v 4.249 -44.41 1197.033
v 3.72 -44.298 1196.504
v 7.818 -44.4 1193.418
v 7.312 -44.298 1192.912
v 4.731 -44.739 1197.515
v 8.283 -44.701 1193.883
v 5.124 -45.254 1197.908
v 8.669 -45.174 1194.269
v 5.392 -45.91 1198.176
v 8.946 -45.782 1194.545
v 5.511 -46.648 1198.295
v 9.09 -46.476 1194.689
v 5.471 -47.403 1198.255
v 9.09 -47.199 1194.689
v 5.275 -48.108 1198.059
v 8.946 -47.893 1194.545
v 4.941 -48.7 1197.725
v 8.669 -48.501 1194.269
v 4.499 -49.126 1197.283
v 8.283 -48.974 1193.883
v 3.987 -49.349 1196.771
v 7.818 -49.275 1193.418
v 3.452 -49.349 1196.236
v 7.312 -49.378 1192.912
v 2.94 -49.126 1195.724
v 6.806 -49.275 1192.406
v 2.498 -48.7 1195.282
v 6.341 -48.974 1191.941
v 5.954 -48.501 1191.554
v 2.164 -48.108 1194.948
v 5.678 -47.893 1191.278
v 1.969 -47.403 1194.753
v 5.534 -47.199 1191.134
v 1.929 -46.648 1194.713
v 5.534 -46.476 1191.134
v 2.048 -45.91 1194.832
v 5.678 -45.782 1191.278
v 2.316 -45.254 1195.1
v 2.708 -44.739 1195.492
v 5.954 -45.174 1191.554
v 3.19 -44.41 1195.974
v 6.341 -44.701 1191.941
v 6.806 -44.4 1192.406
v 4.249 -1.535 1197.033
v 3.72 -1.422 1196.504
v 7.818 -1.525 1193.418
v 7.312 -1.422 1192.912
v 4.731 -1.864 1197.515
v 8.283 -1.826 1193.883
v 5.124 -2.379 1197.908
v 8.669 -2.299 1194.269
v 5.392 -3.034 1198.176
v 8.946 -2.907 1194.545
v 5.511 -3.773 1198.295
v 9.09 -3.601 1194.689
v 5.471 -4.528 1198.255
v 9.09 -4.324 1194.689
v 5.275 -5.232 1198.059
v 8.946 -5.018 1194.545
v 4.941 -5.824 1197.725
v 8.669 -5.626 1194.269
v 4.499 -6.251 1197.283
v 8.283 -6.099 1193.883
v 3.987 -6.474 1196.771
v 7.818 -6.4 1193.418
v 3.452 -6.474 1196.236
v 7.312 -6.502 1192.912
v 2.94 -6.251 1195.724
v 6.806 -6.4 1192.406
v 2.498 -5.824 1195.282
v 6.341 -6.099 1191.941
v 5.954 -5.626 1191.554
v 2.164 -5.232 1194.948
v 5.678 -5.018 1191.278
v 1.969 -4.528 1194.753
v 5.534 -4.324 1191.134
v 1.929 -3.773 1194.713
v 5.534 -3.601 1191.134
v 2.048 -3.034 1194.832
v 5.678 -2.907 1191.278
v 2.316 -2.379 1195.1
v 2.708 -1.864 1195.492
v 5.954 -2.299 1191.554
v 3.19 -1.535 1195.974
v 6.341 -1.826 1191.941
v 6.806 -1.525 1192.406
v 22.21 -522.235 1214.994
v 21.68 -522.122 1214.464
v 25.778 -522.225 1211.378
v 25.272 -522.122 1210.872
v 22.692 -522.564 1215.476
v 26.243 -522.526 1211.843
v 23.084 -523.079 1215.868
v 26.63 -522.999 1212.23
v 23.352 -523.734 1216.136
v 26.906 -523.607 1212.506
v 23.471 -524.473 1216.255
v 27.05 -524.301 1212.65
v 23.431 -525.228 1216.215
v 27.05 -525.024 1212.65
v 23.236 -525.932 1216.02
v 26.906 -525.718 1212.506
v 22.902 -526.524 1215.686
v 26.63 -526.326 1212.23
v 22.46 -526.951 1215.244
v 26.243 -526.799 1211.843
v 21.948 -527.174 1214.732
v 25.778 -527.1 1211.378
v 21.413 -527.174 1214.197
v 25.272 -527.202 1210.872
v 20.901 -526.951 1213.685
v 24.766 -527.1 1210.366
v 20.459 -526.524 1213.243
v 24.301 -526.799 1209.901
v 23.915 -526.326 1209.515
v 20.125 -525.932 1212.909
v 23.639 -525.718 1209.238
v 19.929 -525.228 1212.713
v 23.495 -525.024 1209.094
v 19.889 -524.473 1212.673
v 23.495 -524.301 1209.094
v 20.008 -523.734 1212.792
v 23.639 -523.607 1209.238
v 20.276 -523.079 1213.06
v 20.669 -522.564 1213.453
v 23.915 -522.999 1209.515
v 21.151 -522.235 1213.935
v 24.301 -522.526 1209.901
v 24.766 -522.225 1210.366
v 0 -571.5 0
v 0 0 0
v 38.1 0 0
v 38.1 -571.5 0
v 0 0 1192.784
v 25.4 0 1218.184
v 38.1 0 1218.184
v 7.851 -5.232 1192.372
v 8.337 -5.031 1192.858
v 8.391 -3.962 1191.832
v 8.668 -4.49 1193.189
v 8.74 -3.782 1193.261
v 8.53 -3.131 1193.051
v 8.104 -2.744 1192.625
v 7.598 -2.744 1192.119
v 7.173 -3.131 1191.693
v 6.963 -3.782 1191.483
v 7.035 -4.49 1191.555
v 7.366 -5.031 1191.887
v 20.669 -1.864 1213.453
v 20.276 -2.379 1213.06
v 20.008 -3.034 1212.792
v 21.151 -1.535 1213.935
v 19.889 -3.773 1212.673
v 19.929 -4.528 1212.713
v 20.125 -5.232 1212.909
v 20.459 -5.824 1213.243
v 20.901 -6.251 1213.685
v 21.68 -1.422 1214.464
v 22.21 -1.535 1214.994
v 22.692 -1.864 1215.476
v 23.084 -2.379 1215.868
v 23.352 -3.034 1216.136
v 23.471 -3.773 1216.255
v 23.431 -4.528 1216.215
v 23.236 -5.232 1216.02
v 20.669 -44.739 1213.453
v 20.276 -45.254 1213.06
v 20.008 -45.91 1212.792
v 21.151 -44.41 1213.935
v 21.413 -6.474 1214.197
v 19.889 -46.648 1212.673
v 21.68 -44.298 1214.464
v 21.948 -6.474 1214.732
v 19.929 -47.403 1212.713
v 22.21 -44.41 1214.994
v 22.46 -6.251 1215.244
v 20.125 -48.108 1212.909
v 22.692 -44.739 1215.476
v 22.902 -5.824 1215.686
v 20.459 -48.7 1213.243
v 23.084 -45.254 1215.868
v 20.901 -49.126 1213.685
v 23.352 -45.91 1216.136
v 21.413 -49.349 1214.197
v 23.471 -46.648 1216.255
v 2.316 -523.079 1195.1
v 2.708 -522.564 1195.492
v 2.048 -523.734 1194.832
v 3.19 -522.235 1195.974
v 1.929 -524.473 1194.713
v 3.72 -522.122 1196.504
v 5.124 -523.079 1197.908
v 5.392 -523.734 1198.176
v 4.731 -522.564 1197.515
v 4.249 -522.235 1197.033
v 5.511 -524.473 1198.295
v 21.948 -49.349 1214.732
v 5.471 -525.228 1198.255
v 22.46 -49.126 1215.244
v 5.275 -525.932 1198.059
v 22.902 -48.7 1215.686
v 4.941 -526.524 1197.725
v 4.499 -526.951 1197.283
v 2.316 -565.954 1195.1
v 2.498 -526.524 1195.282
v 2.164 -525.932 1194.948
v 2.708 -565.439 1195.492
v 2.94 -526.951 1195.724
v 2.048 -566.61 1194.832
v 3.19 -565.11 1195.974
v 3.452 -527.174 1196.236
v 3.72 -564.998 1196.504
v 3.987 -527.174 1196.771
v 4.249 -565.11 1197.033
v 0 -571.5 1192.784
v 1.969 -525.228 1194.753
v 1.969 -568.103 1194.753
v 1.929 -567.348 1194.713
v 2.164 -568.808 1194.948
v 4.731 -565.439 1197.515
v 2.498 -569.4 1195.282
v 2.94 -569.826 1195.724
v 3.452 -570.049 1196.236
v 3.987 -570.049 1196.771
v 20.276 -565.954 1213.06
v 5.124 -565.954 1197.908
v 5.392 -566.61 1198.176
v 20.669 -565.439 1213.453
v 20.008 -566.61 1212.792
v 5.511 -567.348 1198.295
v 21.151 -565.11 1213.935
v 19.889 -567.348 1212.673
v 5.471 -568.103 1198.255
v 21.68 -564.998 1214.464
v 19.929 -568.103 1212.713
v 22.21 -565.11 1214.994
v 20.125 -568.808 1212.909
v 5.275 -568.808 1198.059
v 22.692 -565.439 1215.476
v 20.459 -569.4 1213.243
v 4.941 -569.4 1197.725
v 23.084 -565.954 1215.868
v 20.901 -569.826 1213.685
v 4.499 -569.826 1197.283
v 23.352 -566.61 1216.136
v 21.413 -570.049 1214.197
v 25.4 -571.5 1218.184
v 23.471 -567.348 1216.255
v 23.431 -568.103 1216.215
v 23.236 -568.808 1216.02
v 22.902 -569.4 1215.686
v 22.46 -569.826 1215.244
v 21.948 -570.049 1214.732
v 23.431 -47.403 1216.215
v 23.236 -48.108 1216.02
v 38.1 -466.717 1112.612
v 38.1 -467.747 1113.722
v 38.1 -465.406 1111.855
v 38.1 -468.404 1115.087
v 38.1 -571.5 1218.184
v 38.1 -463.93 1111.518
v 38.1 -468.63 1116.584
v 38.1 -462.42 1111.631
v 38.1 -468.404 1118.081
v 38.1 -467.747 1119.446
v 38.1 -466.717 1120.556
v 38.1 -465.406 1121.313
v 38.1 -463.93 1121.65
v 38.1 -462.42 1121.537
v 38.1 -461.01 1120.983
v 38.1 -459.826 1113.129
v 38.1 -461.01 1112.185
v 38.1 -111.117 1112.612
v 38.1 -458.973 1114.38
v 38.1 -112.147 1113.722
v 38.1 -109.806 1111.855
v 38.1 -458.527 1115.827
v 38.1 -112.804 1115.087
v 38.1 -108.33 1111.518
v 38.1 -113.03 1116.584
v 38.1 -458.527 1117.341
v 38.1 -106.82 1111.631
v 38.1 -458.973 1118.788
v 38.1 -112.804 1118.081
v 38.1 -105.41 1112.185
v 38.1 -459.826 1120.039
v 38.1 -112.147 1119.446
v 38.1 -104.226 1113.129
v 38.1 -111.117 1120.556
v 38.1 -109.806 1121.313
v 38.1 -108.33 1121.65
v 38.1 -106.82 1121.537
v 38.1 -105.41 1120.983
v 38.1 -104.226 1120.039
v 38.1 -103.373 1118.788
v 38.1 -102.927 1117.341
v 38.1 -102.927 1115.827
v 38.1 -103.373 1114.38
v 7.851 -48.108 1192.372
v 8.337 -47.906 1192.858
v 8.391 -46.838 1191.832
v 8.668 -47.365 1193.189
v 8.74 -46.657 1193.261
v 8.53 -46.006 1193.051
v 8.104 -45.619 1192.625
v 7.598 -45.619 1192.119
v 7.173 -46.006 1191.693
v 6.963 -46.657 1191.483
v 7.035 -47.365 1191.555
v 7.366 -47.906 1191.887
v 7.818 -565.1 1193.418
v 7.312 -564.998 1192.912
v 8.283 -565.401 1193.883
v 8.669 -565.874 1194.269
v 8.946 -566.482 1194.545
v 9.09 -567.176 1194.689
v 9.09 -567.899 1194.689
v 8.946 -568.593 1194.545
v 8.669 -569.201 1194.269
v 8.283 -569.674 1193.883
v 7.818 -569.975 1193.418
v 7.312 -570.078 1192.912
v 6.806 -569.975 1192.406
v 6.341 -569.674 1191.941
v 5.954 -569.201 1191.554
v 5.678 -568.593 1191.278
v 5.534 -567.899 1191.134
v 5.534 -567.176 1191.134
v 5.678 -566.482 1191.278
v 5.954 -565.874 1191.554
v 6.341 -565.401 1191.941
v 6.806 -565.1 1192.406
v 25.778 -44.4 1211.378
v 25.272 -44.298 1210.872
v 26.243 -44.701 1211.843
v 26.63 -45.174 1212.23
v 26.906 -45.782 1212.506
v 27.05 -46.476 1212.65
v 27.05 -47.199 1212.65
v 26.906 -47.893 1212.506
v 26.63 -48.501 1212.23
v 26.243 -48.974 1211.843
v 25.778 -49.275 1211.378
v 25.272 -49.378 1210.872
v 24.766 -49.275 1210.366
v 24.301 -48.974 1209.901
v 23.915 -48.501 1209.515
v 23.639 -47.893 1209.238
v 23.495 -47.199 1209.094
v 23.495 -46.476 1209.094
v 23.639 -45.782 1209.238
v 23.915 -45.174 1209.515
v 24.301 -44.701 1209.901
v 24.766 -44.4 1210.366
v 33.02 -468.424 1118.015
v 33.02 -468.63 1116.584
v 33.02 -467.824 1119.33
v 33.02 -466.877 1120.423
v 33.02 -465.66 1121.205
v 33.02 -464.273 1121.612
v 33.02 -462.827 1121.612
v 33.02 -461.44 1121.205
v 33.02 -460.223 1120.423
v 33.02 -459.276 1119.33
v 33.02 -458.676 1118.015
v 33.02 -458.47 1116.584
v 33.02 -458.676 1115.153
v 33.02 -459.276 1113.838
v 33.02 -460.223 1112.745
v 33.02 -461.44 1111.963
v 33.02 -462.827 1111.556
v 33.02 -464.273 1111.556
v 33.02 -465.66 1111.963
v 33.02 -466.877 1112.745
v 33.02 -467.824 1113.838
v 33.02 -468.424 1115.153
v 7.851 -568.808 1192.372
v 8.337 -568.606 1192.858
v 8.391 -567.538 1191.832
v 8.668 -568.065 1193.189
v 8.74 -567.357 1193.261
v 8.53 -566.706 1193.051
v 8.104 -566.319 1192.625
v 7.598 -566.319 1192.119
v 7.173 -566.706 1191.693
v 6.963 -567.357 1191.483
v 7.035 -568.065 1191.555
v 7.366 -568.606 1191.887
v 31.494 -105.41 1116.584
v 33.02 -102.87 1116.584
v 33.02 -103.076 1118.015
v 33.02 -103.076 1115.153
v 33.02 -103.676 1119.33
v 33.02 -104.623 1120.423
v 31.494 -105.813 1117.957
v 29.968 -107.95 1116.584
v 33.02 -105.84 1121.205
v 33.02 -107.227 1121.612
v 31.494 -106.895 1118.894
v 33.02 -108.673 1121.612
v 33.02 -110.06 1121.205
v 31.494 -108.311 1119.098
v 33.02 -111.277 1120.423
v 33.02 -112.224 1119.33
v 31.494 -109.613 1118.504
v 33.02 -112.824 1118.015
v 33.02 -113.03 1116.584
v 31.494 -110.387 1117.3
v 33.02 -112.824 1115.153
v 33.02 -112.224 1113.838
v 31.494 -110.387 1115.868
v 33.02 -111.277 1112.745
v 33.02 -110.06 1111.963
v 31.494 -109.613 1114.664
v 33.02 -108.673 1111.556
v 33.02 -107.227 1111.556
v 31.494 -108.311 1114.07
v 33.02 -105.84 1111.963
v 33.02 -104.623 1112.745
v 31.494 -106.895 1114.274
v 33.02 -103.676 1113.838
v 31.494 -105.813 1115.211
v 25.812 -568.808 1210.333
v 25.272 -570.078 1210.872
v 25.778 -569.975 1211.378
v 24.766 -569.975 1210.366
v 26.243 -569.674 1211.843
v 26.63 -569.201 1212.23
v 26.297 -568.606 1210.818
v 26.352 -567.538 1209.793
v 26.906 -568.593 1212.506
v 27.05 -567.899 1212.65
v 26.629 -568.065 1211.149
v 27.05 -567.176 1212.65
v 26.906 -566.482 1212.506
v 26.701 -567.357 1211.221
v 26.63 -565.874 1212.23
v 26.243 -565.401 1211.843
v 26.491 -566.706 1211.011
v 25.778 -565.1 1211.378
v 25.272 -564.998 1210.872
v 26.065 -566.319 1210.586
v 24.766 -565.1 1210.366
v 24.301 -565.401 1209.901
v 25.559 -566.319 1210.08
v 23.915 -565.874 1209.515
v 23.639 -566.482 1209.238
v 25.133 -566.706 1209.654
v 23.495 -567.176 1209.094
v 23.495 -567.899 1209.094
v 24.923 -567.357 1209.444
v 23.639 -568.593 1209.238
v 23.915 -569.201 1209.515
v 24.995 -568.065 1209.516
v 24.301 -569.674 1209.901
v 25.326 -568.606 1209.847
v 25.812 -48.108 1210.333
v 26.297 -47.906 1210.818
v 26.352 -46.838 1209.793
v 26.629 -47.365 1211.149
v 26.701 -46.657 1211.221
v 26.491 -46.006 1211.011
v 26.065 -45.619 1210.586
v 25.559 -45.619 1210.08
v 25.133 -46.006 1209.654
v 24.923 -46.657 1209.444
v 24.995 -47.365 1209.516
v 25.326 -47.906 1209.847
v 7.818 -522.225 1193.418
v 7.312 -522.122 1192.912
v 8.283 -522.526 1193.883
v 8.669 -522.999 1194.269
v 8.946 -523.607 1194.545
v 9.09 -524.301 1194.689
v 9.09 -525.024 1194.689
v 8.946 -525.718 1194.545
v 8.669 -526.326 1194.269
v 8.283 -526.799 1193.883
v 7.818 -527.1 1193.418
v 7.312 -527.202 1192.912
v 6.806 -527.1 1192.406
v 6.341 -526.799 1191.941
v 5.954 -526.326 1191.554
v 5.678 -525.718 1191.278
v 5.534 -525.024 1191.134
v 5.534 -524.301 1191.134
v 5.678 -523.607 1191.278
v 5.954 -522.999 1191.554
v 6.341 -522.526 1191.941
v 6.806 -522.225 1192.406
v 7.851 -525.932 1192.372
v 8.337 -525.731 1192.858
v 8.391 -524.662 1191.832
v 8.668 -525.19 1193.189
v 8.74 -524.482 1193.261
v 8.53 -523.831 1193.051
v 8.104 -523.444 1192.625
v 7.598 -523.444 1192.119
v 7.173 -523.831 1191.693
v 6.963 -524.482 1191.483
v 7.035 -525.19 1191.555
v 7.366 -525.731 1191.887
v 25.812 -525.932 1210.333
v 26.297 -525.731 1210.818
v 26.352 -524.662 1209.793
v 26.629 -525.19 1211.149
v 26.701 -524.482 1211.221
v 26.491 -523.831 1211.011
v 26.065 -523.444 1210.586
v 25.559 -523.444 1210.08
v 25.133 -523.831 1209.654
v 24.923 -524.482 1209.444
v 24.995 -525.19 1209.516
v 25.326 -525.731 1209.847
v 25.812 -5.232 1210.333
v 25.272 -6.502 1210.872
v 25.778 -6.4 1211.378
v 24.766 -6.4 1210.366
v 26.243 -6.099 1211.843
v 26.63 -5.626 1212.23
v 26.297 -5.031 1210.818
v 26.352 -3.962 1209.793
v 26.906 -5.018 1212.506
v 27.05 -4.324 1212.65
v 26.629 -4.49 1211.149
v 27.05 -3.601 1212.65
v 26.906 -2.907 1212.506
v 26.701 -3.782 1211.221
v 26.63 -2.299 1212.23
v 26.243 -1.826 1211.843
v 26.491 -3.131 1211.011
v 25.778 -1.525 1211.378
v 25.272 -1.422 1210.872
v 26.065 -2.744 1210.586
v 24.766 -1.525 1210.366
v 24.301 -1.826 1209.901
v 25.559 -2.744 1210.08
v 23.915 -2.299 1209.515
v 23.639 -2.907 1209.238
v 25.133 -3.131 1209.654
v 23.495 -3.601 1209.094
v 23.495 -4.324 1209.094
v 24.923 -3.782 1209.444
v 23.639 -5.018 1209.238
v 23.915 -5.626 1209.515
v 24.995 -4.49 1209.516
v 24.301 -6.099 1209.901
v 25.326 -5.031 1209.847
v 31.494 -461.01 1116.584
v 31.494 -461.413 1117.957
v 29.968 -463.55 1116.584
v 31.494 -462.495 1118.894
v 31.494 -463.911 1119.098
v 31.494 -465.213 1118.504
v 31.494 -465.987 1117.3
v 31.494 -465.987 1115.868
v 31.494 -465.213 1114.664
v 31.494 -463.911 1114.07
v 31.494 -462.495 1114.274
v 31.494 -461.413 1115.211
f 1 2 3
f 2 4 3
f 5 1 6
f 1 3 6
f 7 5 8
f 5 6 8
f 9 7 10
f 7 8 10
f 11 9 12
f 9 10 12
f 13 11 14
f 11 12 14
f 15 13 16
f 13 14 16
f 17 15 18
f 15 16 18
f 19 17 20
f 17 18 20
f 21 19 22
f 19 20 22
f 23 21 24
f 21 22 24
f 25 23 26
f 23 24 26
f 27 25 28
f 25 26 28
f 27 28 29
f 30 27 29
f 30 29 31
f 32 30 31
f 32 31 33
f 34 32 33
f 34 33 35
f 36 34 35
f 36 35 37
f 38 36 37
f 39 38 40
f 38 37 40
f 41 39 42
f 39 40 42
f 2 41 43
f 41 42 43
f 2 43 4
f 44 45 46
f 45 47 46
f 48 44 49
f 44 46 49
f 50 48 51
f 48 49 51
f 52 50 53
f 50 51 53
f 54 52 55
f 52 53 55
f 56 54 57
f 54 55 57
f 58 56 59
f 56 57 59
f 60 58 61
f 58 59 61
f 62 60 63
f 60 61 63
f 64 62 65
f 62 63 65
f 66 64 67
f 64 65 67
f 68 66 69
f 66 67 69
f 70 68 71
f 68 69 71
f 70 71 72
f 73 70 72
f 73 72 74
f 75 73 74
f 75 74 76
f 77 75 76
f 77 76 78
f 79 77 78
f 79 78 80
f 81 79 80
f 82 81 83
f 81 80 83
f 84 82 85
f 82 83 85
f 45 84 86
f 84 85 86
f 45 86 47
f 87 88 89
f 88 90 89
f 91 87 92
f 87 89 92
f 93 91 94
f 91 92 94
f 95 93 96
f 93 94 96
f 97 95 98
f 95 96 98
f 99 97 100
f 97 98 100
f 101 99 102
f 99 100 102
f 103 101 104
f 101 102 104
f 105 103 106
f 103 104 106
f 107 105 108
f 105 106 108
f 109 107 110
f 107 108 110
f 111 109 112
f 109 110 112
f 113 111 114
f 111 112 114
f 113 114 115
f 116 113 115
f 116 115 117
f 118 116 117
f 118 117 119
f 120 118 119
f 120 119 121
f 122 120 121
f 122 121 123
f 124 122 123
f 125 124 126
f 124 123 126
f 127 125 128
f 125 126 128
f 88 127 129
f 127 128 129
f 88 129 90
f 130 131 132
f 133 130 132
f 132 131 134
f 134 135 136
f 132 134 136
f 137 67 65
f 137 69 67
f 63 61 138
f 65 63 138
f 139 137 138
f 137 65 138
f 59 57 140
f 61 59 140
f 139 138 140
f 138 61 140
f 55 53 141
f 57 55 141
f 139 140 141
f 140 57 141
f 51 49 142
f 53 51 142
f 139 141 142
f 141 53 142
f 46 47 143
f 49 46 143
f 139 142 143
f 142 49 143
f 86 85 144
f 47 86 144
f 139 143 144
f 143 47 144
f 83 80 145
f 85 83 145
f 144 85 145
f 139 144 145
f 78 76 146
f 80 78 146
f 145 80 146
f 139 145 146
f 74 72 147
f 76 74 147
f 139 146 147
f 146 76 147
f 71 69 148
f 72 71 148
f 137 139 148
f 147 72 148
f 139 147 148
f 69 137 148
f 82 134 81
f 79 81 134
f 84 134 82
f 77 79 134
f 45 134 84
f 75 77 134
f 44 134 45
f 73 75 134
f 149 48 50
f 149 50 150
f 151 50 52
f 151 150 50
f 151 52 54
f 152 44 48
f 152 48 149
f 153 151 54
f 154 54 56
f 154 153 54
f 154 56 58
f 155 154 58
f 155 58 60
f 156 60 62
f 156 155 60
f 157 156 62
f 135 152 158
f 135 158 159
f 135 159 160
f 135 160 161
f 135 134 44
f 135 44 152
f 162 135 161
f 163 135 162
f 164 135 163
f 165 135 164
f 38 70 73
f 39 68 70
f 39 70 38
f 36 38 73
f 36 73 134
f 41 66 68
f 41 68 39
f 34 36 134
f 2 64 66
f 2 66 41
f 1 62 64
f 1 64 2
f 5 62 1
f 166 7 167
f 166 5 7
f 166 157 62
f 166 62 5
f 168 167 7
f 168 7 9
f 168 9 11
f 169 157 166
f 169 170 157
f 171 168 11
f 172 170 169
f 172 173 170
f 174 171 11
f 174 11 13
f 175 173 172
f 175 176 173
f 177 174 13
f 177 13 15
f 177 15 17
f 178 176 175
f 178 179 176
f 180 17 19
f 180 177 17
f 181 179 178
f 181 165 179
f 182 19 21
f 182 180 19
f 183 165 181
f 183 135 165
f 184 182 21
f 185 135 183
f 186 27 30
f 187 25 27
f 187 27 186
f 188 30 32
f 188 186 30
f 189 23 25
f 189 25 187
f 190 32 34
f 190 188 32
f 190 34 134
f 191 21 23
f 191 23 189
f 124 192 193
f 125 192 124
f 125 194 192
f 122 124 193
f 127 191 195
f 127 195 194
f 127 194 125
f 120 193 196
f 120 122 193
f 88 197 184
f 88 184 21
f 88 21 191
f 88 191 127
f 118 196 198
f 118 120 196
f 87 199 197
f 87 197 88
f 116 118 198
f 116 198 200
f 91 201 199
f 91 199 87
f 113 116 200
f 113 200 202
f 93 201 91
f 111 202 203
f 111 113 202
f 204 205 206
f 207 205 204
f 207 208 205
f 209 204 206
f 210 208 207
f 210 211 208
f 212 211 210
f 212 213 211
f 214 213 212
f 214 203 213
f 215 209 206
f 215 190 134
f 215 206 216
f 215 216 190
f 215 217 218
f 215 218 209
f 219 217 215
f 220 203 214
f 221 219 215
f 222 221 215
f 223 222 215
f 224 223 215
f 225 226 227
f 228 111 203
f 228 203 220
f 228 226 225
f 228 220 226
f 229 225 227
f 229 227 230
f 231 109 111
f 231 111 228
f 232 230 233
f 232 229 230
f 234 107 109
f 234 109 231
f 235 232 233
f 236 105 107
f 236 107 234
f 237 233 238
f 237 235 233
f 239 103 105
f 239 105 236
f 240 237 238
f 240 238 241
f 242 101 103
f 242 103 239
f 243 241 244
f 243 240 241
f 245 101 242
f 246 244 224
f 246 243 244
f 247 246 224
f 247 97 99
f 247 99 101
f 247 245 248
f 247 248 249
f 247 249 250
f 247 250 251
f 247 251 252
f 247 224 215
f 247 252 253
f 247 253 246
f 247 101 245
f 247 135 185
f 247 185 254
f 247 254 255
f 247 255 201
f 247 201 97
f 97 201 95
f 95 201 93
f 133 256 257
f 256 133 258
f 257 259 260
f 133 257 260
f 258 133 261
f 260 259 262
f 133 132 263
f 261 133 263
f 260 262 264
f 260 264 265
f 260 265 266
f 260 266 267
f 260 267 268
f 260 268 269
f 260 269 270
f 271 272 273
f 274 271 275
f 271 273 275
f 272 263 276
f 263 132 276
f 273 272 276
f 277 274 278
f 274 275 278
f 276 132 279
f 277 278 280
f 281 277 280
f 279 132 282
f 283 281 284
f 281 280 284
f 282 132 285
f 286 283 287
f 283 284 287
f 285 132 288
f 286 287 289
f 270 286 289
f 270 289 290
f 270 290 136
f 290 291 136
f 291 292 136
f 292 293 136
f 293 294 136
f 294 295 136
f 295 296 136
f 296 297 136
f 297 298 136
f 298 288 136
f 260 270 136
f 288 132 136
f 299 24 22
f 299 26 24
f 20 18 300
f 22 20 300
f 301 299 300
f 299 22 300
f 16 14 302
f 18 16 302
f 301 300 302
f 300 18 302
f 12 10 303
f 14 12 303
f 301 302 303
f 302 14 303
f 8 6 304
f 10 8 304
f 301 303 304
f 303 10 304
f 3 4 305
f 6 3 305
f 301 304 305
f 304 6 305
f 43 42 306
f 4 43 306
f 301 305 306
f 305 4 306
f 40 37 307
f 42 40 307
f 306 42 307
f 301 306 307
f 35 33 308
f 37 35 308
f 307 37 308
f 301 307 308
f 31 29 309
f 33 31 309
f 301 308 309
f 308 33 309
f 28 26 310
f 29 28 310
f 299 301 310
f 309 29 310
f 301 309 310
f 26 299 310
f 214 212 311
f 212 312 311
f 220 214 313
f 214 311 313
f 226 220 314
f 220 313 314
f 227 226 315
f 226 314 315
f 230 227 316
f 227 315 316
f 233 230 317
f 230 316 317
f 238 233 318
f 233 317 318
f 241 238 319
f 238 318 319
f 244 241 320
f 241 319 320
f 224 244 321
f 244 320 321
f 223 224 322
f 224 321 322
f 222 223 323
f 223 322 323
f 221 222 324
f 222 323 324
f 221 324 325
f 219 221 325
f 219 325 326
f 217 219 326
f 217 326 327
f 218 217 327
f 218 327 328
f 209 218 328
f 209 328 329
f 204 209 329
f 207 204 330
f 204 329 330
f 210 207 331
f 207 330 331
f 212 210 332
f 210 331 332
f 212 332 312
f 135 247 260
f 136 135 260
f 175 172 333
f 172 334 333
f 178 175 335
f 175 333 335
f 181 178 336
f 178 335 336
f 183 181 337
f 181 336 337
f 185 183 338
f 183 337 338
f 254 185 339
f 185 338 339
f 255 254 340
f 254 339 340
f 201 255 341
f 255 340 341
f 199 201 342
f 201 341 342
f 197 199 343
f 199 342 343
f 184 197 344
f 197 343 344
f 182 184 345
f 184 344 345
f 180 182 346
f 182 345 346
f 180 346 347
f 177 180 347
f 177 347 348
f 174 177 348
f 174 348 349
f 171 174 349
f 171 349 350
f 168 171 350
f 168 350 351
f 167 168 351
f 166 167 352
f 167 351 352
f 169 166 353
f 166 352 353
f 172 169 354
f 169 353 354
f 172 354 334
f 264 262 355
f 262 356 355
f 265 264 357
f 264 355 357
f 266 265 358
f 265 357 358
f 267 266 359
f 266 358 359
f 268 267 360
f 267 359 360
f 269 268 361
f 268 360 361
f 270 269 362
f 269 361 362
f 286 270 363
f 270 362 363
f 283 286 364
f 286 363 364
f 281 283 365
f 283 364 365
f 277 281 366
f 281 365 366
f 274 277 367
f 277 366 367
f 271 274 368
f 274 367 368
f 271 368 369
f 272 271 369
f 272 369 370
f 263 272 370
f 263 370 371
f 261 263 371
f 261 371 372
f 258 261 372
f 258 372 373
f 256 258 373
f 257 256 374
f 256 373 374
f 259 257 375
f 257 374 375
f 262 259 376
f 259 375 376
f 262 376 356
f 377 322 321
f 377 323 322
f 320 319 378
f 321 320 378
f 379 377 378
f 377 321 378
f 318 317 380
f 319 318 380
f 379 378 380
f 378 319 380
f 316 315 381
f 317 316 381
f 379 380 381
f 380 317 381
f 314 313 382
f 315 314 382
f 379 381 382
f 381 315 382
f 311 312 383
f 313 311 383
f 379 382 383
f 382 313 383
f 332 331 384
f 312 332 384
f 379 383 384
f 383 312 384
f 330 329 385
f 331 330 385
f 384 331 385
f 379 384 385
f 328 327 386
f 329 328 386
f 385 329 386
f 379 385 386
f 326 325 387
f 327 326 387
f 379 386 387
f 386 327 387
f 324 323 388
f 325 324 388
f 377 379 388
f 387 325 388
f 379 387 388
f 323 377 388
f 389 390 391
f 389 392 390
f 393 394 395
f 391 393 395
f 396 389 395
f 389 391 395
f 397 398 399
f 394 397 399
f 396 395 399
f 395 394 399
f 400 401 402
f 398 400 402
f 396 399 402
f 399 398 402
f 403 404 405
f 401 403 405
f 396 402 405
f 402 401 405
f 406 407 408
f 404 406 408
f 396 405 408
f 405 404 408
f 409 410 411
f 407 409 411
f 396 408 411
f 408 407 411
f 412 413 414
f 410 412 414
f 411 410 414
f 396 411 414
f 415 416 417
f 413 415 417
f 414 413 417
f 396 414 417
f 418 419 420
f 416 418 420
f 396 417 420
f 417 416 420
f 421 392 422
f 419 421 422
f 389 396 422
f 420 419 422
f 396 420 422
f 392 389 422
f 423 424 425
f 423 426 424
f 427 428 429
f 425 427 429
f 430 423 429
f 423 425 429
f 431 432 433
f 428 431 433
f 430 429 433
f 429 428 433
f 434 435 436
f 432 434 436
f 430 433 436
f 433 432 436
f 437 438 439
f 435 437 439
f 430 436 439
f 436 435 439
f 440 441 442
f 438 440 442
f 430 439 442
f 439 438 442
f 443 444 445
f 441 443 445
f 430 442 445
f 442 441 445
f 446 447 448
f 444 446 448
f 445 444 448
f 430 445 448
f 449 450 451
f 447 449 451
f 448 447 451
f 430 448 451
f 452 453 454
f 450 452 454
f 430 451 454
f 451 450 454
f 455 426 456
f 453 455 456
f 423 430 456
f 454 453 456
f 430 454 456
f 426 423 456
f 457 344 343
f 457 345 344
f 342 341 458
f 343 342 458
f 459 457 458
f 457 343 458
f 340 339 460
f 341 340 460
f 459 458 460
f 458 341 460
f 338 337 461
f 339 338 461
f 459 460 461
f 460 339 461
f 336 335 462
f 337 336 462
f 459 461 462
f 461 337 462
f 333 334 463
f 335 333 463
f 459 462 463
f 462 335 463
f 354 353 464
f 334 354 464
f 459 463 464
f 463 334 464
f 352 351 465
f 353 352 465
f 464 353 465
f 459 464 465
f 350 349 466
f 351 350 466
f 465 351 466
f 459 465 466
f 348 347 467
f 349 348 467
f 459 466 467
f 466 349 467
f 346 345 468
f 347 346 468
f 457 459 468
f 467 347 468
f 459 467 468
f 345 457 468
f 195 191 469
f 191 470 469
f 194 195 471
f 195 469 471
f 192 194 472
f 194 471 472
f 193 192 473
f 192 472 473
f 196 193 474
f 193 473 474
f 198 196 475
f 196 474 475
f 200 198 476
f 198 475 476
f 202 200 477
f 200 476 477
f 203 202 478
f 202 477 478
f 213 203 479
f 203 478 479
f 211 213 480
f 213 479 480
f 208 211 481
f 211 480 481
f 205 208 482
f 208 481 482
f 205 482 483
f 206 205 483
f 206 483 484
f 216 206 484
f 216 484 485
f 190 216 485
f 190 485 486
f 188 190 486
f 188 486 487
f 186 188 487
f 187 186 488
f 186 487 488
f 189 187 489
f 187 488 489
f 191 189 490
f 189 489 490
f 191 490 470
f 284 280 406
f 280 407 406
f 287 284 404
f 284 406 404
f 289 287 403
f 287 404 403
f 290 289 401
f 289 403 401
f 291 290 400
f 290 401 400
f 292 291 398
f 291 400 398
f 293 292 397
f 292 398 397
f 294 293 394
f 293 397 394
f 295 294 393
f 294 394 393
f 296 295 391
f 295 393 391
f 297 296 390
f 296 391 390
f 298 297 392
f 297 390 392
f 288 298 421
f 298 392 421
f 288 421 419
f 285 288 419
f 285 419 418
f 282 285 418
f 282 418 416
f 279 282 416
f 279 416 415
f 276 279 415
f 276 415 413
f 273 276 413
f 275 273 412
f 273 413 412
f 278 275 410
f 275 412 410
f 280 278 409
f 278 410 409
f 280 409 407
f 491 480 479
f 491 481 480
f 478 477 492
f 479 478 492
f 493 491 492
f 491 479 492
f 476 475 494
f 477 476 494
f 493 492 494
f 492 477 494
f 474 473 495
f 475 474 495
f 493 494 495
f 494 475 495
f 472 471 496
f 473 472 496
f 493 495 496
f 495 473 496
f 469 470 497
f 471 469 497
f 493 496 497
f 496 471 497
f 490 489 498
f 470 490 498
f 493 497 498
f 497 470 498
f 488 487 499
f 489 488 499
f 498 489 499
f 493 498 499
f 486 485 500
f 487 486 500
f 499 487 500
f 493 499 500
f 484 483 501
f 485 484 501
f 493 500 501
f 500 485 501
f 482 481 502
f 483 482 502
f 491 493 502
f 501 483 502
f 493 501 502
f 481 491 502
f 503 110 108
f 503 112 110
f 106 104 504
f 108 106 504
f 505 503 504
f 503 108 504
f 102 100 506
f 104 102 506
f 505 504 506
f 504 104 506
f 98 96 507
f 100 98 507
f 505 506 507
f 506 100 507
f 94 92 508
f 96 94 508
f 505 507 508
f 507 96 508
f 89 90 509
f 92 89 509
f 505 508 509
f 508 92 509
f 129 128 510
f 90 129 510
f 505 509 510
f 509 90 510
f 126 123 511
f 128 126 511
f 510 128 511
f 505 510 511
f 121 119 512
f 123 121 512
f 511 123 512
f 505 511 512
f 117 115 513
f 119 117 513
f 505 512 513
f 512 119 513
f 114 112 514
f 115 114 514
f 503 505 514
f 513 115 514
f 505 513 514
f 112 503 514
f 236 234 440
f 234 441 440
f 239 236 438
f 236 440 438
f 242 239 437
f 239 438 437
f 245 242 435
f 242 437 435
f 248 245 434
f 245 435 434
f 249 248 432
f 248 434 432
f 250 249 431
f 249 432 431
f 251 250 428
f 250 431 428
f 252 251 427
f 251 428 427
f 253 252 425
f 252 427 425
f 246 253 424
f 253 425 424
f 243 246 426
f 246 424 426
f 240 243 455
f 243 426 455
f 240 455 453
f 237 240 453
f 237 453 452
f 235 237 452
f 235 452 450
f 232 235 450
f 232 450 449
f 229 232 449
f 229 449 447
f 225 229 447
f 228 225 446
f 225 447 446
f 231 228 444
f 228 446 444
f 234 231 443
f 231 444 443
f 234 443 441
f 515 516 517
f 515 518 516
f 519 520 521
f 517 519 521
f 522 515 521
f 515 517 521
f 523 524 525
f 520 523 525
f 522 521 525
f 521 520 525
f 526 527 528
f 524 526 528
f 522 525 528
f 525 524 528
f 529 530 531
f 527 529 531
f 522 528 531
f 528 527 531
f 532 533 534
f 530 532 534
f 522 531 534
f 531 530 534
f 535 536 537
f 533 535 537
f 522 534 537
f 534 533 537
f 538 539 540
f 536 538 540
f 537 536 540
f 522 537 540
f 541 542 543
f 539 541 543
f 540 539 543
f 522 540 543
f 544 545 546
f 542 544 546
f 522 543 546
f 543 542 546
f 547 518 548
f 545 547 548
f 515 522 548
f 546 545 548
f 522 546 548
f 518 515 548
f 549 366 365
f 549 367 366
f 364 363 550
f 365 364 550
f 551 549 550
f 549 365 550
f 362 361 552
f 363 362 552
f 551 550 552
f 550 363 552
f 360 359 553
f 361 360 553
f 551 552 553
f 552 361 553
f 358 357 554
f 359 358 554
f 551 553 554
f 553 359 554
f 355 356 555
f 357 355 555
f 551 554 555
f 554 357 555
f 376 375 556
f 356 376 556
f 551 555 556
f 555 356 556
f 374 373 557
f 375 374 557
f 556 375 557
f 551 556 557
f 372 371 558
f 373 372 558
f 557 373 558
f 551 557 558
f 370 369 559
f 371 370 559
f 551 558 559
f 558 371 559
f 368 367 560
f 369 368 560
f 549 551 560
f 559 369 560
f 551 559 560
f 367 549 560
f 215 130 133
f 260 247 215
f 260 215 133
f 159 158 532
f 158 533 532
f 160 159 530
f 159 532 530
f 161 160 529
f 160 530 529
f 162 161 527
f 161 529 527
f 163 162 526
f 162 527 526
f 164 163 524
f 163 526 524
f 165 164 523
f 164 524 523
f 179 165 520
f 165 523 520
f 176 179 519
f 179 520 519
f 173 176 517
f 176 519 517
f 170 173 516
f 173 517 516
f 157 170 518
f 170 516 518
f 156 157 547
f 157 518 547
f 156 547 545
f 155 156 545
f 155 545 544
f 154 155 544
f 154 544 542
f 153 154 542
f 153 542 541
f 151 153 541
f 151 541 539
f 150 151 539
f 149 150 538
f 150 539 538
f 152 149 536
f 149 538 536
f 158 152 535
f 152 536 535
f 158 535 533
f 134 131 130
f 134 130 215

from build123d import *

# Parameters (mm, degrees)
F0_W     = 38.1
F0_H     = 1218.184
F1_DEPTH = 571.5
F2_SIZE2 = 25.4
F2_SIZE  = 25.4
F4_D     = 5.08
F4_DEPTH = 5.08
F4_TIP   = 1.5261859723
F6_D     = 10.16
F6_DEPTH = 5.08
F6_TIP   = 3.0523719447


with BuildPart() as f1:
    # F0 (on Front) → F1 (new body)
    with BuildSketch(Plane.XZ):
        with Locations((19.05, 609.092)):
            Rectangle(F0_W, F0_H)
    extrude(amount=F1_DEPTH)

    # F2
    f2_edges = [f1.edges().sort_by_distance(p)[0] for p in [
        (0, -285.75, 1218.184),
    ]]
    chamfer(f2_edges, length=F2_SIZE, length2=F2_SIZE2)

    # F4
    with Locations(Plane(origin=(-596.392, 0, 596.392), x_dir=(0, -1, 0), z_dir=(-0.7071067812, 0, 0.7071067812))):
        with Locations((3.9624, 874.086167133), (3.9624, 848.686167133), (46.8376, 874.086167133), (46.8376, 848.686167133), (524.6624, 874.086167133), (524.6624, 848.686167133), (567.5376, 848.686167133), (567.5376, 874.086167133)):
            Hole(F4_D / 2, depth=F4_DEPTH)
            with Locations((0, 0, -(F4_DEPTH + F4_TIP / 2))):  # 118° drill point
                Cone(0, F4_D / 2, F4_TIP, mode=Mode.SUBTRACT)

    # F6
    with Locations(Plane.YZ.offset(38.1)):
        with Locations((-463.55, 1116.584), (-107.95, 1116.584)):
            Hole(F6_D / 2, depth=F6_DEPTH)
            with Locations((0, 0, -(F6_DEPTH + F6_TIP / 2))):  # 118° drill point
                Cone(0, F6_D / 2, F6_TIP, mode=Mode.SUBTRACT)


solid = f1.part
